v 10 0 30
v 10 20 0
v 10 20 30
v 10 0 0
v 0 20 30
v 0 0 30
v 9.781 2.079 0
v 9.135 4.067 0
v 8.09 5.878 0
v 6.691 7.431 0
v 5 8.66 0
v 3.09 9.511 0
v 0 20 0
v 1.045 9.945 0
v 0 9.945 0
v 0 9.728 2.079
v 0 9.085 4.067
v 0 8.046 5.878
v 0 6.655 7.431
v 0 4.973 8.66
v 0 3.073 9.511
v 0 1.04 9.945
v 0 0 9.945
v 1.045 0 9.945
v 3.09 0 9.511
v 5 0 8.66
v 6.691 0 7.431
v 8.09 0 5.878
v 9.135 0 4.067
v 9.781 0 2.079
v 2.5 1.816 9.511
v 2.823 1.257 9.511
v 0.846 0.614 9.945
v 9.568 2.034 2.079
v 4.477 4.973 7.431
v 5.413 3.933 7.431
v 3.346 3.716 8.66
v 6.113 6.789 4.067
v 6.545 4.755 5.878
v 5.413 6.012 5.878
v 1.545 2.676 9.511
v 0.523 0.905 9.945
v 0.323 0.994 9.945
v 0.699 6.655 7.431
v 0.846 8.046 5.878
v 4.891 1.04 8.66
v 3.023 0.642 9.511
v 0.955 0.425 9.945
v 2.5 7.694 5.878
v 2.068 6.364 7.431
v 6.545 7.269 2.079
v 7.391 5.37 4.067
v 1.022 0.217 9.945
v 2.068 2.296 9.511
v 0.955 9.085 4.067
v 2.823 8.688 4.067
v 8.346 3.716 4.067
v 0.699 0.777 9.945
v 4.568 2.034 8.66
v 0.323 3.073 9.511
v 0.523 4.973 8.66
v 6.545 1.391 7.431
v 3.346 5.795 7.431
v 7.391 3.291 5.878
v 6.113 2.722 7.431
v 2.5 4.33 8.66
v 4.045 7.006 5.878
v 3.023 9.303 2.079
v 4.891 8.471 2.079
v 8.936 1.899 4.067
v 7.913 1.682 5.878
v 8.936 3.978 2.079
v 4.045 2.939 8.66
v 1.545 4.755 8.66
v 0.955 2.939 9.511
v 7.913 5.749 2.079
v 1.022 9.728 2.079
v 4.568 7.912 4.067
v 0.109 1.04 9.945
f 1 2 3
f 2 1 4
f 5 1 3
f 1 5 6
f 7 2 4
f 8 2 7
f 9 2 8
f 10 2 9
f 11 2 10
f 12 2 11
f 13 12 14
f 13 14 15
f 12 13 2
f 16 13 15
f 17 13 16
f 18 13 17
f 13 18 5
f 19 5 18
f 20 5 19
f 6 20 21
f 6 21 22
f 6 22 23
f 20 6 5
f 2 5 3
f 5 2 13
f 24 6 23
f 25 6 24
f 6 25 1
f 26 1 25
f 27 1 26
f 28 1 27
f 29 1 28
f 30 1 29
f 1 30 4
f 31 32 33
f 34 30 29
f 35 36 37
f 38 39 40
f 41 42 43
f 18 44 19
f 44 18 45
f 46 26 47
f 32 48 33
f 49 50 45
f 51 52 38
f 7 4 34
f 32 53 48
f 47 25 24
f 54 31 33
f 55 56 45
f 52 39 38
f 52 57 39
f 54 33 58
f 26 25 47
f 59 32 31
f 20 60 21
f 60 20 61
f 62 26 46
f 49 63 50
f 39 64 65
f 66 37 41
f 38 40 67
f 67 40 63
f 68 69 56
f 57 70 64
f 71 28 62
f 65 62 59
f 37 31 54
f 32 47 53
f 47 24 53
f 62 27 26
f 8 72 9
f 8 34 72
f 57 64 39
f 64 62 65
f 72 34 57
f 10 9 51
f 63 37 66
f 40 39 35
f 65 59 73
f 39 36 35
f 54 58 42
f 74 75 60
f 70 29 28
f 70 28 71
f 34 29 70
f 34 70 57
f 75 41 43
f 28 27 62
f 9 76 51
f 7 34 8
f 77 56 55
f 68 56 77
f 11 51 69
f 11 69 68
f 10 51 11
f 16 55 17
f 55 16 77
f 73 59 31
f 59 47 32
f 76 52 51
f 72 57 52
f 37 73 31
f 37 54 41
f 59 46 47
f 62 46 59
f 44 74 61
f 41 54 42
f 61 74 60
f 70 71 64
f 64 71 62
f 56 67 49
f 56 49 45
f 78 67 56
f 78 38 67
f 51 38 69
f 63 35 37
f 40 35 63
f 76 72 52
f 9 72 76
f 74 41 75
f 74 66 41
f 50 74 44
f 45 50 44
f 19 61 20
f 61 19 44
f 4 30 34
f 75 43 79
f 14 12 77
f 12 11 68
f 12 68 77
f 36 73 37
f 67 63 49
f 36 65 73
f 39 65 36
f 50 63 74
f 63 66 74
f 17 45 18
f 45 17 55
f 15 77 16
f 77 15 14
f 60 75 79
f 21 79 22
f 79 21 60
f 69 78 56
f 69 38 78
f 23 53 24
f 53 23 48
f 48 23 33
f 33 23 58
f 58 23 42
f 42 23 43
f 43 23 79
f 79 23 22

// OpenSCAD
union() {
	difference() {
		cube(size = [10, 20, 30]);
		#sphere(r = 10);
	}
	%cylinder(h = 30, r = 4);
}
